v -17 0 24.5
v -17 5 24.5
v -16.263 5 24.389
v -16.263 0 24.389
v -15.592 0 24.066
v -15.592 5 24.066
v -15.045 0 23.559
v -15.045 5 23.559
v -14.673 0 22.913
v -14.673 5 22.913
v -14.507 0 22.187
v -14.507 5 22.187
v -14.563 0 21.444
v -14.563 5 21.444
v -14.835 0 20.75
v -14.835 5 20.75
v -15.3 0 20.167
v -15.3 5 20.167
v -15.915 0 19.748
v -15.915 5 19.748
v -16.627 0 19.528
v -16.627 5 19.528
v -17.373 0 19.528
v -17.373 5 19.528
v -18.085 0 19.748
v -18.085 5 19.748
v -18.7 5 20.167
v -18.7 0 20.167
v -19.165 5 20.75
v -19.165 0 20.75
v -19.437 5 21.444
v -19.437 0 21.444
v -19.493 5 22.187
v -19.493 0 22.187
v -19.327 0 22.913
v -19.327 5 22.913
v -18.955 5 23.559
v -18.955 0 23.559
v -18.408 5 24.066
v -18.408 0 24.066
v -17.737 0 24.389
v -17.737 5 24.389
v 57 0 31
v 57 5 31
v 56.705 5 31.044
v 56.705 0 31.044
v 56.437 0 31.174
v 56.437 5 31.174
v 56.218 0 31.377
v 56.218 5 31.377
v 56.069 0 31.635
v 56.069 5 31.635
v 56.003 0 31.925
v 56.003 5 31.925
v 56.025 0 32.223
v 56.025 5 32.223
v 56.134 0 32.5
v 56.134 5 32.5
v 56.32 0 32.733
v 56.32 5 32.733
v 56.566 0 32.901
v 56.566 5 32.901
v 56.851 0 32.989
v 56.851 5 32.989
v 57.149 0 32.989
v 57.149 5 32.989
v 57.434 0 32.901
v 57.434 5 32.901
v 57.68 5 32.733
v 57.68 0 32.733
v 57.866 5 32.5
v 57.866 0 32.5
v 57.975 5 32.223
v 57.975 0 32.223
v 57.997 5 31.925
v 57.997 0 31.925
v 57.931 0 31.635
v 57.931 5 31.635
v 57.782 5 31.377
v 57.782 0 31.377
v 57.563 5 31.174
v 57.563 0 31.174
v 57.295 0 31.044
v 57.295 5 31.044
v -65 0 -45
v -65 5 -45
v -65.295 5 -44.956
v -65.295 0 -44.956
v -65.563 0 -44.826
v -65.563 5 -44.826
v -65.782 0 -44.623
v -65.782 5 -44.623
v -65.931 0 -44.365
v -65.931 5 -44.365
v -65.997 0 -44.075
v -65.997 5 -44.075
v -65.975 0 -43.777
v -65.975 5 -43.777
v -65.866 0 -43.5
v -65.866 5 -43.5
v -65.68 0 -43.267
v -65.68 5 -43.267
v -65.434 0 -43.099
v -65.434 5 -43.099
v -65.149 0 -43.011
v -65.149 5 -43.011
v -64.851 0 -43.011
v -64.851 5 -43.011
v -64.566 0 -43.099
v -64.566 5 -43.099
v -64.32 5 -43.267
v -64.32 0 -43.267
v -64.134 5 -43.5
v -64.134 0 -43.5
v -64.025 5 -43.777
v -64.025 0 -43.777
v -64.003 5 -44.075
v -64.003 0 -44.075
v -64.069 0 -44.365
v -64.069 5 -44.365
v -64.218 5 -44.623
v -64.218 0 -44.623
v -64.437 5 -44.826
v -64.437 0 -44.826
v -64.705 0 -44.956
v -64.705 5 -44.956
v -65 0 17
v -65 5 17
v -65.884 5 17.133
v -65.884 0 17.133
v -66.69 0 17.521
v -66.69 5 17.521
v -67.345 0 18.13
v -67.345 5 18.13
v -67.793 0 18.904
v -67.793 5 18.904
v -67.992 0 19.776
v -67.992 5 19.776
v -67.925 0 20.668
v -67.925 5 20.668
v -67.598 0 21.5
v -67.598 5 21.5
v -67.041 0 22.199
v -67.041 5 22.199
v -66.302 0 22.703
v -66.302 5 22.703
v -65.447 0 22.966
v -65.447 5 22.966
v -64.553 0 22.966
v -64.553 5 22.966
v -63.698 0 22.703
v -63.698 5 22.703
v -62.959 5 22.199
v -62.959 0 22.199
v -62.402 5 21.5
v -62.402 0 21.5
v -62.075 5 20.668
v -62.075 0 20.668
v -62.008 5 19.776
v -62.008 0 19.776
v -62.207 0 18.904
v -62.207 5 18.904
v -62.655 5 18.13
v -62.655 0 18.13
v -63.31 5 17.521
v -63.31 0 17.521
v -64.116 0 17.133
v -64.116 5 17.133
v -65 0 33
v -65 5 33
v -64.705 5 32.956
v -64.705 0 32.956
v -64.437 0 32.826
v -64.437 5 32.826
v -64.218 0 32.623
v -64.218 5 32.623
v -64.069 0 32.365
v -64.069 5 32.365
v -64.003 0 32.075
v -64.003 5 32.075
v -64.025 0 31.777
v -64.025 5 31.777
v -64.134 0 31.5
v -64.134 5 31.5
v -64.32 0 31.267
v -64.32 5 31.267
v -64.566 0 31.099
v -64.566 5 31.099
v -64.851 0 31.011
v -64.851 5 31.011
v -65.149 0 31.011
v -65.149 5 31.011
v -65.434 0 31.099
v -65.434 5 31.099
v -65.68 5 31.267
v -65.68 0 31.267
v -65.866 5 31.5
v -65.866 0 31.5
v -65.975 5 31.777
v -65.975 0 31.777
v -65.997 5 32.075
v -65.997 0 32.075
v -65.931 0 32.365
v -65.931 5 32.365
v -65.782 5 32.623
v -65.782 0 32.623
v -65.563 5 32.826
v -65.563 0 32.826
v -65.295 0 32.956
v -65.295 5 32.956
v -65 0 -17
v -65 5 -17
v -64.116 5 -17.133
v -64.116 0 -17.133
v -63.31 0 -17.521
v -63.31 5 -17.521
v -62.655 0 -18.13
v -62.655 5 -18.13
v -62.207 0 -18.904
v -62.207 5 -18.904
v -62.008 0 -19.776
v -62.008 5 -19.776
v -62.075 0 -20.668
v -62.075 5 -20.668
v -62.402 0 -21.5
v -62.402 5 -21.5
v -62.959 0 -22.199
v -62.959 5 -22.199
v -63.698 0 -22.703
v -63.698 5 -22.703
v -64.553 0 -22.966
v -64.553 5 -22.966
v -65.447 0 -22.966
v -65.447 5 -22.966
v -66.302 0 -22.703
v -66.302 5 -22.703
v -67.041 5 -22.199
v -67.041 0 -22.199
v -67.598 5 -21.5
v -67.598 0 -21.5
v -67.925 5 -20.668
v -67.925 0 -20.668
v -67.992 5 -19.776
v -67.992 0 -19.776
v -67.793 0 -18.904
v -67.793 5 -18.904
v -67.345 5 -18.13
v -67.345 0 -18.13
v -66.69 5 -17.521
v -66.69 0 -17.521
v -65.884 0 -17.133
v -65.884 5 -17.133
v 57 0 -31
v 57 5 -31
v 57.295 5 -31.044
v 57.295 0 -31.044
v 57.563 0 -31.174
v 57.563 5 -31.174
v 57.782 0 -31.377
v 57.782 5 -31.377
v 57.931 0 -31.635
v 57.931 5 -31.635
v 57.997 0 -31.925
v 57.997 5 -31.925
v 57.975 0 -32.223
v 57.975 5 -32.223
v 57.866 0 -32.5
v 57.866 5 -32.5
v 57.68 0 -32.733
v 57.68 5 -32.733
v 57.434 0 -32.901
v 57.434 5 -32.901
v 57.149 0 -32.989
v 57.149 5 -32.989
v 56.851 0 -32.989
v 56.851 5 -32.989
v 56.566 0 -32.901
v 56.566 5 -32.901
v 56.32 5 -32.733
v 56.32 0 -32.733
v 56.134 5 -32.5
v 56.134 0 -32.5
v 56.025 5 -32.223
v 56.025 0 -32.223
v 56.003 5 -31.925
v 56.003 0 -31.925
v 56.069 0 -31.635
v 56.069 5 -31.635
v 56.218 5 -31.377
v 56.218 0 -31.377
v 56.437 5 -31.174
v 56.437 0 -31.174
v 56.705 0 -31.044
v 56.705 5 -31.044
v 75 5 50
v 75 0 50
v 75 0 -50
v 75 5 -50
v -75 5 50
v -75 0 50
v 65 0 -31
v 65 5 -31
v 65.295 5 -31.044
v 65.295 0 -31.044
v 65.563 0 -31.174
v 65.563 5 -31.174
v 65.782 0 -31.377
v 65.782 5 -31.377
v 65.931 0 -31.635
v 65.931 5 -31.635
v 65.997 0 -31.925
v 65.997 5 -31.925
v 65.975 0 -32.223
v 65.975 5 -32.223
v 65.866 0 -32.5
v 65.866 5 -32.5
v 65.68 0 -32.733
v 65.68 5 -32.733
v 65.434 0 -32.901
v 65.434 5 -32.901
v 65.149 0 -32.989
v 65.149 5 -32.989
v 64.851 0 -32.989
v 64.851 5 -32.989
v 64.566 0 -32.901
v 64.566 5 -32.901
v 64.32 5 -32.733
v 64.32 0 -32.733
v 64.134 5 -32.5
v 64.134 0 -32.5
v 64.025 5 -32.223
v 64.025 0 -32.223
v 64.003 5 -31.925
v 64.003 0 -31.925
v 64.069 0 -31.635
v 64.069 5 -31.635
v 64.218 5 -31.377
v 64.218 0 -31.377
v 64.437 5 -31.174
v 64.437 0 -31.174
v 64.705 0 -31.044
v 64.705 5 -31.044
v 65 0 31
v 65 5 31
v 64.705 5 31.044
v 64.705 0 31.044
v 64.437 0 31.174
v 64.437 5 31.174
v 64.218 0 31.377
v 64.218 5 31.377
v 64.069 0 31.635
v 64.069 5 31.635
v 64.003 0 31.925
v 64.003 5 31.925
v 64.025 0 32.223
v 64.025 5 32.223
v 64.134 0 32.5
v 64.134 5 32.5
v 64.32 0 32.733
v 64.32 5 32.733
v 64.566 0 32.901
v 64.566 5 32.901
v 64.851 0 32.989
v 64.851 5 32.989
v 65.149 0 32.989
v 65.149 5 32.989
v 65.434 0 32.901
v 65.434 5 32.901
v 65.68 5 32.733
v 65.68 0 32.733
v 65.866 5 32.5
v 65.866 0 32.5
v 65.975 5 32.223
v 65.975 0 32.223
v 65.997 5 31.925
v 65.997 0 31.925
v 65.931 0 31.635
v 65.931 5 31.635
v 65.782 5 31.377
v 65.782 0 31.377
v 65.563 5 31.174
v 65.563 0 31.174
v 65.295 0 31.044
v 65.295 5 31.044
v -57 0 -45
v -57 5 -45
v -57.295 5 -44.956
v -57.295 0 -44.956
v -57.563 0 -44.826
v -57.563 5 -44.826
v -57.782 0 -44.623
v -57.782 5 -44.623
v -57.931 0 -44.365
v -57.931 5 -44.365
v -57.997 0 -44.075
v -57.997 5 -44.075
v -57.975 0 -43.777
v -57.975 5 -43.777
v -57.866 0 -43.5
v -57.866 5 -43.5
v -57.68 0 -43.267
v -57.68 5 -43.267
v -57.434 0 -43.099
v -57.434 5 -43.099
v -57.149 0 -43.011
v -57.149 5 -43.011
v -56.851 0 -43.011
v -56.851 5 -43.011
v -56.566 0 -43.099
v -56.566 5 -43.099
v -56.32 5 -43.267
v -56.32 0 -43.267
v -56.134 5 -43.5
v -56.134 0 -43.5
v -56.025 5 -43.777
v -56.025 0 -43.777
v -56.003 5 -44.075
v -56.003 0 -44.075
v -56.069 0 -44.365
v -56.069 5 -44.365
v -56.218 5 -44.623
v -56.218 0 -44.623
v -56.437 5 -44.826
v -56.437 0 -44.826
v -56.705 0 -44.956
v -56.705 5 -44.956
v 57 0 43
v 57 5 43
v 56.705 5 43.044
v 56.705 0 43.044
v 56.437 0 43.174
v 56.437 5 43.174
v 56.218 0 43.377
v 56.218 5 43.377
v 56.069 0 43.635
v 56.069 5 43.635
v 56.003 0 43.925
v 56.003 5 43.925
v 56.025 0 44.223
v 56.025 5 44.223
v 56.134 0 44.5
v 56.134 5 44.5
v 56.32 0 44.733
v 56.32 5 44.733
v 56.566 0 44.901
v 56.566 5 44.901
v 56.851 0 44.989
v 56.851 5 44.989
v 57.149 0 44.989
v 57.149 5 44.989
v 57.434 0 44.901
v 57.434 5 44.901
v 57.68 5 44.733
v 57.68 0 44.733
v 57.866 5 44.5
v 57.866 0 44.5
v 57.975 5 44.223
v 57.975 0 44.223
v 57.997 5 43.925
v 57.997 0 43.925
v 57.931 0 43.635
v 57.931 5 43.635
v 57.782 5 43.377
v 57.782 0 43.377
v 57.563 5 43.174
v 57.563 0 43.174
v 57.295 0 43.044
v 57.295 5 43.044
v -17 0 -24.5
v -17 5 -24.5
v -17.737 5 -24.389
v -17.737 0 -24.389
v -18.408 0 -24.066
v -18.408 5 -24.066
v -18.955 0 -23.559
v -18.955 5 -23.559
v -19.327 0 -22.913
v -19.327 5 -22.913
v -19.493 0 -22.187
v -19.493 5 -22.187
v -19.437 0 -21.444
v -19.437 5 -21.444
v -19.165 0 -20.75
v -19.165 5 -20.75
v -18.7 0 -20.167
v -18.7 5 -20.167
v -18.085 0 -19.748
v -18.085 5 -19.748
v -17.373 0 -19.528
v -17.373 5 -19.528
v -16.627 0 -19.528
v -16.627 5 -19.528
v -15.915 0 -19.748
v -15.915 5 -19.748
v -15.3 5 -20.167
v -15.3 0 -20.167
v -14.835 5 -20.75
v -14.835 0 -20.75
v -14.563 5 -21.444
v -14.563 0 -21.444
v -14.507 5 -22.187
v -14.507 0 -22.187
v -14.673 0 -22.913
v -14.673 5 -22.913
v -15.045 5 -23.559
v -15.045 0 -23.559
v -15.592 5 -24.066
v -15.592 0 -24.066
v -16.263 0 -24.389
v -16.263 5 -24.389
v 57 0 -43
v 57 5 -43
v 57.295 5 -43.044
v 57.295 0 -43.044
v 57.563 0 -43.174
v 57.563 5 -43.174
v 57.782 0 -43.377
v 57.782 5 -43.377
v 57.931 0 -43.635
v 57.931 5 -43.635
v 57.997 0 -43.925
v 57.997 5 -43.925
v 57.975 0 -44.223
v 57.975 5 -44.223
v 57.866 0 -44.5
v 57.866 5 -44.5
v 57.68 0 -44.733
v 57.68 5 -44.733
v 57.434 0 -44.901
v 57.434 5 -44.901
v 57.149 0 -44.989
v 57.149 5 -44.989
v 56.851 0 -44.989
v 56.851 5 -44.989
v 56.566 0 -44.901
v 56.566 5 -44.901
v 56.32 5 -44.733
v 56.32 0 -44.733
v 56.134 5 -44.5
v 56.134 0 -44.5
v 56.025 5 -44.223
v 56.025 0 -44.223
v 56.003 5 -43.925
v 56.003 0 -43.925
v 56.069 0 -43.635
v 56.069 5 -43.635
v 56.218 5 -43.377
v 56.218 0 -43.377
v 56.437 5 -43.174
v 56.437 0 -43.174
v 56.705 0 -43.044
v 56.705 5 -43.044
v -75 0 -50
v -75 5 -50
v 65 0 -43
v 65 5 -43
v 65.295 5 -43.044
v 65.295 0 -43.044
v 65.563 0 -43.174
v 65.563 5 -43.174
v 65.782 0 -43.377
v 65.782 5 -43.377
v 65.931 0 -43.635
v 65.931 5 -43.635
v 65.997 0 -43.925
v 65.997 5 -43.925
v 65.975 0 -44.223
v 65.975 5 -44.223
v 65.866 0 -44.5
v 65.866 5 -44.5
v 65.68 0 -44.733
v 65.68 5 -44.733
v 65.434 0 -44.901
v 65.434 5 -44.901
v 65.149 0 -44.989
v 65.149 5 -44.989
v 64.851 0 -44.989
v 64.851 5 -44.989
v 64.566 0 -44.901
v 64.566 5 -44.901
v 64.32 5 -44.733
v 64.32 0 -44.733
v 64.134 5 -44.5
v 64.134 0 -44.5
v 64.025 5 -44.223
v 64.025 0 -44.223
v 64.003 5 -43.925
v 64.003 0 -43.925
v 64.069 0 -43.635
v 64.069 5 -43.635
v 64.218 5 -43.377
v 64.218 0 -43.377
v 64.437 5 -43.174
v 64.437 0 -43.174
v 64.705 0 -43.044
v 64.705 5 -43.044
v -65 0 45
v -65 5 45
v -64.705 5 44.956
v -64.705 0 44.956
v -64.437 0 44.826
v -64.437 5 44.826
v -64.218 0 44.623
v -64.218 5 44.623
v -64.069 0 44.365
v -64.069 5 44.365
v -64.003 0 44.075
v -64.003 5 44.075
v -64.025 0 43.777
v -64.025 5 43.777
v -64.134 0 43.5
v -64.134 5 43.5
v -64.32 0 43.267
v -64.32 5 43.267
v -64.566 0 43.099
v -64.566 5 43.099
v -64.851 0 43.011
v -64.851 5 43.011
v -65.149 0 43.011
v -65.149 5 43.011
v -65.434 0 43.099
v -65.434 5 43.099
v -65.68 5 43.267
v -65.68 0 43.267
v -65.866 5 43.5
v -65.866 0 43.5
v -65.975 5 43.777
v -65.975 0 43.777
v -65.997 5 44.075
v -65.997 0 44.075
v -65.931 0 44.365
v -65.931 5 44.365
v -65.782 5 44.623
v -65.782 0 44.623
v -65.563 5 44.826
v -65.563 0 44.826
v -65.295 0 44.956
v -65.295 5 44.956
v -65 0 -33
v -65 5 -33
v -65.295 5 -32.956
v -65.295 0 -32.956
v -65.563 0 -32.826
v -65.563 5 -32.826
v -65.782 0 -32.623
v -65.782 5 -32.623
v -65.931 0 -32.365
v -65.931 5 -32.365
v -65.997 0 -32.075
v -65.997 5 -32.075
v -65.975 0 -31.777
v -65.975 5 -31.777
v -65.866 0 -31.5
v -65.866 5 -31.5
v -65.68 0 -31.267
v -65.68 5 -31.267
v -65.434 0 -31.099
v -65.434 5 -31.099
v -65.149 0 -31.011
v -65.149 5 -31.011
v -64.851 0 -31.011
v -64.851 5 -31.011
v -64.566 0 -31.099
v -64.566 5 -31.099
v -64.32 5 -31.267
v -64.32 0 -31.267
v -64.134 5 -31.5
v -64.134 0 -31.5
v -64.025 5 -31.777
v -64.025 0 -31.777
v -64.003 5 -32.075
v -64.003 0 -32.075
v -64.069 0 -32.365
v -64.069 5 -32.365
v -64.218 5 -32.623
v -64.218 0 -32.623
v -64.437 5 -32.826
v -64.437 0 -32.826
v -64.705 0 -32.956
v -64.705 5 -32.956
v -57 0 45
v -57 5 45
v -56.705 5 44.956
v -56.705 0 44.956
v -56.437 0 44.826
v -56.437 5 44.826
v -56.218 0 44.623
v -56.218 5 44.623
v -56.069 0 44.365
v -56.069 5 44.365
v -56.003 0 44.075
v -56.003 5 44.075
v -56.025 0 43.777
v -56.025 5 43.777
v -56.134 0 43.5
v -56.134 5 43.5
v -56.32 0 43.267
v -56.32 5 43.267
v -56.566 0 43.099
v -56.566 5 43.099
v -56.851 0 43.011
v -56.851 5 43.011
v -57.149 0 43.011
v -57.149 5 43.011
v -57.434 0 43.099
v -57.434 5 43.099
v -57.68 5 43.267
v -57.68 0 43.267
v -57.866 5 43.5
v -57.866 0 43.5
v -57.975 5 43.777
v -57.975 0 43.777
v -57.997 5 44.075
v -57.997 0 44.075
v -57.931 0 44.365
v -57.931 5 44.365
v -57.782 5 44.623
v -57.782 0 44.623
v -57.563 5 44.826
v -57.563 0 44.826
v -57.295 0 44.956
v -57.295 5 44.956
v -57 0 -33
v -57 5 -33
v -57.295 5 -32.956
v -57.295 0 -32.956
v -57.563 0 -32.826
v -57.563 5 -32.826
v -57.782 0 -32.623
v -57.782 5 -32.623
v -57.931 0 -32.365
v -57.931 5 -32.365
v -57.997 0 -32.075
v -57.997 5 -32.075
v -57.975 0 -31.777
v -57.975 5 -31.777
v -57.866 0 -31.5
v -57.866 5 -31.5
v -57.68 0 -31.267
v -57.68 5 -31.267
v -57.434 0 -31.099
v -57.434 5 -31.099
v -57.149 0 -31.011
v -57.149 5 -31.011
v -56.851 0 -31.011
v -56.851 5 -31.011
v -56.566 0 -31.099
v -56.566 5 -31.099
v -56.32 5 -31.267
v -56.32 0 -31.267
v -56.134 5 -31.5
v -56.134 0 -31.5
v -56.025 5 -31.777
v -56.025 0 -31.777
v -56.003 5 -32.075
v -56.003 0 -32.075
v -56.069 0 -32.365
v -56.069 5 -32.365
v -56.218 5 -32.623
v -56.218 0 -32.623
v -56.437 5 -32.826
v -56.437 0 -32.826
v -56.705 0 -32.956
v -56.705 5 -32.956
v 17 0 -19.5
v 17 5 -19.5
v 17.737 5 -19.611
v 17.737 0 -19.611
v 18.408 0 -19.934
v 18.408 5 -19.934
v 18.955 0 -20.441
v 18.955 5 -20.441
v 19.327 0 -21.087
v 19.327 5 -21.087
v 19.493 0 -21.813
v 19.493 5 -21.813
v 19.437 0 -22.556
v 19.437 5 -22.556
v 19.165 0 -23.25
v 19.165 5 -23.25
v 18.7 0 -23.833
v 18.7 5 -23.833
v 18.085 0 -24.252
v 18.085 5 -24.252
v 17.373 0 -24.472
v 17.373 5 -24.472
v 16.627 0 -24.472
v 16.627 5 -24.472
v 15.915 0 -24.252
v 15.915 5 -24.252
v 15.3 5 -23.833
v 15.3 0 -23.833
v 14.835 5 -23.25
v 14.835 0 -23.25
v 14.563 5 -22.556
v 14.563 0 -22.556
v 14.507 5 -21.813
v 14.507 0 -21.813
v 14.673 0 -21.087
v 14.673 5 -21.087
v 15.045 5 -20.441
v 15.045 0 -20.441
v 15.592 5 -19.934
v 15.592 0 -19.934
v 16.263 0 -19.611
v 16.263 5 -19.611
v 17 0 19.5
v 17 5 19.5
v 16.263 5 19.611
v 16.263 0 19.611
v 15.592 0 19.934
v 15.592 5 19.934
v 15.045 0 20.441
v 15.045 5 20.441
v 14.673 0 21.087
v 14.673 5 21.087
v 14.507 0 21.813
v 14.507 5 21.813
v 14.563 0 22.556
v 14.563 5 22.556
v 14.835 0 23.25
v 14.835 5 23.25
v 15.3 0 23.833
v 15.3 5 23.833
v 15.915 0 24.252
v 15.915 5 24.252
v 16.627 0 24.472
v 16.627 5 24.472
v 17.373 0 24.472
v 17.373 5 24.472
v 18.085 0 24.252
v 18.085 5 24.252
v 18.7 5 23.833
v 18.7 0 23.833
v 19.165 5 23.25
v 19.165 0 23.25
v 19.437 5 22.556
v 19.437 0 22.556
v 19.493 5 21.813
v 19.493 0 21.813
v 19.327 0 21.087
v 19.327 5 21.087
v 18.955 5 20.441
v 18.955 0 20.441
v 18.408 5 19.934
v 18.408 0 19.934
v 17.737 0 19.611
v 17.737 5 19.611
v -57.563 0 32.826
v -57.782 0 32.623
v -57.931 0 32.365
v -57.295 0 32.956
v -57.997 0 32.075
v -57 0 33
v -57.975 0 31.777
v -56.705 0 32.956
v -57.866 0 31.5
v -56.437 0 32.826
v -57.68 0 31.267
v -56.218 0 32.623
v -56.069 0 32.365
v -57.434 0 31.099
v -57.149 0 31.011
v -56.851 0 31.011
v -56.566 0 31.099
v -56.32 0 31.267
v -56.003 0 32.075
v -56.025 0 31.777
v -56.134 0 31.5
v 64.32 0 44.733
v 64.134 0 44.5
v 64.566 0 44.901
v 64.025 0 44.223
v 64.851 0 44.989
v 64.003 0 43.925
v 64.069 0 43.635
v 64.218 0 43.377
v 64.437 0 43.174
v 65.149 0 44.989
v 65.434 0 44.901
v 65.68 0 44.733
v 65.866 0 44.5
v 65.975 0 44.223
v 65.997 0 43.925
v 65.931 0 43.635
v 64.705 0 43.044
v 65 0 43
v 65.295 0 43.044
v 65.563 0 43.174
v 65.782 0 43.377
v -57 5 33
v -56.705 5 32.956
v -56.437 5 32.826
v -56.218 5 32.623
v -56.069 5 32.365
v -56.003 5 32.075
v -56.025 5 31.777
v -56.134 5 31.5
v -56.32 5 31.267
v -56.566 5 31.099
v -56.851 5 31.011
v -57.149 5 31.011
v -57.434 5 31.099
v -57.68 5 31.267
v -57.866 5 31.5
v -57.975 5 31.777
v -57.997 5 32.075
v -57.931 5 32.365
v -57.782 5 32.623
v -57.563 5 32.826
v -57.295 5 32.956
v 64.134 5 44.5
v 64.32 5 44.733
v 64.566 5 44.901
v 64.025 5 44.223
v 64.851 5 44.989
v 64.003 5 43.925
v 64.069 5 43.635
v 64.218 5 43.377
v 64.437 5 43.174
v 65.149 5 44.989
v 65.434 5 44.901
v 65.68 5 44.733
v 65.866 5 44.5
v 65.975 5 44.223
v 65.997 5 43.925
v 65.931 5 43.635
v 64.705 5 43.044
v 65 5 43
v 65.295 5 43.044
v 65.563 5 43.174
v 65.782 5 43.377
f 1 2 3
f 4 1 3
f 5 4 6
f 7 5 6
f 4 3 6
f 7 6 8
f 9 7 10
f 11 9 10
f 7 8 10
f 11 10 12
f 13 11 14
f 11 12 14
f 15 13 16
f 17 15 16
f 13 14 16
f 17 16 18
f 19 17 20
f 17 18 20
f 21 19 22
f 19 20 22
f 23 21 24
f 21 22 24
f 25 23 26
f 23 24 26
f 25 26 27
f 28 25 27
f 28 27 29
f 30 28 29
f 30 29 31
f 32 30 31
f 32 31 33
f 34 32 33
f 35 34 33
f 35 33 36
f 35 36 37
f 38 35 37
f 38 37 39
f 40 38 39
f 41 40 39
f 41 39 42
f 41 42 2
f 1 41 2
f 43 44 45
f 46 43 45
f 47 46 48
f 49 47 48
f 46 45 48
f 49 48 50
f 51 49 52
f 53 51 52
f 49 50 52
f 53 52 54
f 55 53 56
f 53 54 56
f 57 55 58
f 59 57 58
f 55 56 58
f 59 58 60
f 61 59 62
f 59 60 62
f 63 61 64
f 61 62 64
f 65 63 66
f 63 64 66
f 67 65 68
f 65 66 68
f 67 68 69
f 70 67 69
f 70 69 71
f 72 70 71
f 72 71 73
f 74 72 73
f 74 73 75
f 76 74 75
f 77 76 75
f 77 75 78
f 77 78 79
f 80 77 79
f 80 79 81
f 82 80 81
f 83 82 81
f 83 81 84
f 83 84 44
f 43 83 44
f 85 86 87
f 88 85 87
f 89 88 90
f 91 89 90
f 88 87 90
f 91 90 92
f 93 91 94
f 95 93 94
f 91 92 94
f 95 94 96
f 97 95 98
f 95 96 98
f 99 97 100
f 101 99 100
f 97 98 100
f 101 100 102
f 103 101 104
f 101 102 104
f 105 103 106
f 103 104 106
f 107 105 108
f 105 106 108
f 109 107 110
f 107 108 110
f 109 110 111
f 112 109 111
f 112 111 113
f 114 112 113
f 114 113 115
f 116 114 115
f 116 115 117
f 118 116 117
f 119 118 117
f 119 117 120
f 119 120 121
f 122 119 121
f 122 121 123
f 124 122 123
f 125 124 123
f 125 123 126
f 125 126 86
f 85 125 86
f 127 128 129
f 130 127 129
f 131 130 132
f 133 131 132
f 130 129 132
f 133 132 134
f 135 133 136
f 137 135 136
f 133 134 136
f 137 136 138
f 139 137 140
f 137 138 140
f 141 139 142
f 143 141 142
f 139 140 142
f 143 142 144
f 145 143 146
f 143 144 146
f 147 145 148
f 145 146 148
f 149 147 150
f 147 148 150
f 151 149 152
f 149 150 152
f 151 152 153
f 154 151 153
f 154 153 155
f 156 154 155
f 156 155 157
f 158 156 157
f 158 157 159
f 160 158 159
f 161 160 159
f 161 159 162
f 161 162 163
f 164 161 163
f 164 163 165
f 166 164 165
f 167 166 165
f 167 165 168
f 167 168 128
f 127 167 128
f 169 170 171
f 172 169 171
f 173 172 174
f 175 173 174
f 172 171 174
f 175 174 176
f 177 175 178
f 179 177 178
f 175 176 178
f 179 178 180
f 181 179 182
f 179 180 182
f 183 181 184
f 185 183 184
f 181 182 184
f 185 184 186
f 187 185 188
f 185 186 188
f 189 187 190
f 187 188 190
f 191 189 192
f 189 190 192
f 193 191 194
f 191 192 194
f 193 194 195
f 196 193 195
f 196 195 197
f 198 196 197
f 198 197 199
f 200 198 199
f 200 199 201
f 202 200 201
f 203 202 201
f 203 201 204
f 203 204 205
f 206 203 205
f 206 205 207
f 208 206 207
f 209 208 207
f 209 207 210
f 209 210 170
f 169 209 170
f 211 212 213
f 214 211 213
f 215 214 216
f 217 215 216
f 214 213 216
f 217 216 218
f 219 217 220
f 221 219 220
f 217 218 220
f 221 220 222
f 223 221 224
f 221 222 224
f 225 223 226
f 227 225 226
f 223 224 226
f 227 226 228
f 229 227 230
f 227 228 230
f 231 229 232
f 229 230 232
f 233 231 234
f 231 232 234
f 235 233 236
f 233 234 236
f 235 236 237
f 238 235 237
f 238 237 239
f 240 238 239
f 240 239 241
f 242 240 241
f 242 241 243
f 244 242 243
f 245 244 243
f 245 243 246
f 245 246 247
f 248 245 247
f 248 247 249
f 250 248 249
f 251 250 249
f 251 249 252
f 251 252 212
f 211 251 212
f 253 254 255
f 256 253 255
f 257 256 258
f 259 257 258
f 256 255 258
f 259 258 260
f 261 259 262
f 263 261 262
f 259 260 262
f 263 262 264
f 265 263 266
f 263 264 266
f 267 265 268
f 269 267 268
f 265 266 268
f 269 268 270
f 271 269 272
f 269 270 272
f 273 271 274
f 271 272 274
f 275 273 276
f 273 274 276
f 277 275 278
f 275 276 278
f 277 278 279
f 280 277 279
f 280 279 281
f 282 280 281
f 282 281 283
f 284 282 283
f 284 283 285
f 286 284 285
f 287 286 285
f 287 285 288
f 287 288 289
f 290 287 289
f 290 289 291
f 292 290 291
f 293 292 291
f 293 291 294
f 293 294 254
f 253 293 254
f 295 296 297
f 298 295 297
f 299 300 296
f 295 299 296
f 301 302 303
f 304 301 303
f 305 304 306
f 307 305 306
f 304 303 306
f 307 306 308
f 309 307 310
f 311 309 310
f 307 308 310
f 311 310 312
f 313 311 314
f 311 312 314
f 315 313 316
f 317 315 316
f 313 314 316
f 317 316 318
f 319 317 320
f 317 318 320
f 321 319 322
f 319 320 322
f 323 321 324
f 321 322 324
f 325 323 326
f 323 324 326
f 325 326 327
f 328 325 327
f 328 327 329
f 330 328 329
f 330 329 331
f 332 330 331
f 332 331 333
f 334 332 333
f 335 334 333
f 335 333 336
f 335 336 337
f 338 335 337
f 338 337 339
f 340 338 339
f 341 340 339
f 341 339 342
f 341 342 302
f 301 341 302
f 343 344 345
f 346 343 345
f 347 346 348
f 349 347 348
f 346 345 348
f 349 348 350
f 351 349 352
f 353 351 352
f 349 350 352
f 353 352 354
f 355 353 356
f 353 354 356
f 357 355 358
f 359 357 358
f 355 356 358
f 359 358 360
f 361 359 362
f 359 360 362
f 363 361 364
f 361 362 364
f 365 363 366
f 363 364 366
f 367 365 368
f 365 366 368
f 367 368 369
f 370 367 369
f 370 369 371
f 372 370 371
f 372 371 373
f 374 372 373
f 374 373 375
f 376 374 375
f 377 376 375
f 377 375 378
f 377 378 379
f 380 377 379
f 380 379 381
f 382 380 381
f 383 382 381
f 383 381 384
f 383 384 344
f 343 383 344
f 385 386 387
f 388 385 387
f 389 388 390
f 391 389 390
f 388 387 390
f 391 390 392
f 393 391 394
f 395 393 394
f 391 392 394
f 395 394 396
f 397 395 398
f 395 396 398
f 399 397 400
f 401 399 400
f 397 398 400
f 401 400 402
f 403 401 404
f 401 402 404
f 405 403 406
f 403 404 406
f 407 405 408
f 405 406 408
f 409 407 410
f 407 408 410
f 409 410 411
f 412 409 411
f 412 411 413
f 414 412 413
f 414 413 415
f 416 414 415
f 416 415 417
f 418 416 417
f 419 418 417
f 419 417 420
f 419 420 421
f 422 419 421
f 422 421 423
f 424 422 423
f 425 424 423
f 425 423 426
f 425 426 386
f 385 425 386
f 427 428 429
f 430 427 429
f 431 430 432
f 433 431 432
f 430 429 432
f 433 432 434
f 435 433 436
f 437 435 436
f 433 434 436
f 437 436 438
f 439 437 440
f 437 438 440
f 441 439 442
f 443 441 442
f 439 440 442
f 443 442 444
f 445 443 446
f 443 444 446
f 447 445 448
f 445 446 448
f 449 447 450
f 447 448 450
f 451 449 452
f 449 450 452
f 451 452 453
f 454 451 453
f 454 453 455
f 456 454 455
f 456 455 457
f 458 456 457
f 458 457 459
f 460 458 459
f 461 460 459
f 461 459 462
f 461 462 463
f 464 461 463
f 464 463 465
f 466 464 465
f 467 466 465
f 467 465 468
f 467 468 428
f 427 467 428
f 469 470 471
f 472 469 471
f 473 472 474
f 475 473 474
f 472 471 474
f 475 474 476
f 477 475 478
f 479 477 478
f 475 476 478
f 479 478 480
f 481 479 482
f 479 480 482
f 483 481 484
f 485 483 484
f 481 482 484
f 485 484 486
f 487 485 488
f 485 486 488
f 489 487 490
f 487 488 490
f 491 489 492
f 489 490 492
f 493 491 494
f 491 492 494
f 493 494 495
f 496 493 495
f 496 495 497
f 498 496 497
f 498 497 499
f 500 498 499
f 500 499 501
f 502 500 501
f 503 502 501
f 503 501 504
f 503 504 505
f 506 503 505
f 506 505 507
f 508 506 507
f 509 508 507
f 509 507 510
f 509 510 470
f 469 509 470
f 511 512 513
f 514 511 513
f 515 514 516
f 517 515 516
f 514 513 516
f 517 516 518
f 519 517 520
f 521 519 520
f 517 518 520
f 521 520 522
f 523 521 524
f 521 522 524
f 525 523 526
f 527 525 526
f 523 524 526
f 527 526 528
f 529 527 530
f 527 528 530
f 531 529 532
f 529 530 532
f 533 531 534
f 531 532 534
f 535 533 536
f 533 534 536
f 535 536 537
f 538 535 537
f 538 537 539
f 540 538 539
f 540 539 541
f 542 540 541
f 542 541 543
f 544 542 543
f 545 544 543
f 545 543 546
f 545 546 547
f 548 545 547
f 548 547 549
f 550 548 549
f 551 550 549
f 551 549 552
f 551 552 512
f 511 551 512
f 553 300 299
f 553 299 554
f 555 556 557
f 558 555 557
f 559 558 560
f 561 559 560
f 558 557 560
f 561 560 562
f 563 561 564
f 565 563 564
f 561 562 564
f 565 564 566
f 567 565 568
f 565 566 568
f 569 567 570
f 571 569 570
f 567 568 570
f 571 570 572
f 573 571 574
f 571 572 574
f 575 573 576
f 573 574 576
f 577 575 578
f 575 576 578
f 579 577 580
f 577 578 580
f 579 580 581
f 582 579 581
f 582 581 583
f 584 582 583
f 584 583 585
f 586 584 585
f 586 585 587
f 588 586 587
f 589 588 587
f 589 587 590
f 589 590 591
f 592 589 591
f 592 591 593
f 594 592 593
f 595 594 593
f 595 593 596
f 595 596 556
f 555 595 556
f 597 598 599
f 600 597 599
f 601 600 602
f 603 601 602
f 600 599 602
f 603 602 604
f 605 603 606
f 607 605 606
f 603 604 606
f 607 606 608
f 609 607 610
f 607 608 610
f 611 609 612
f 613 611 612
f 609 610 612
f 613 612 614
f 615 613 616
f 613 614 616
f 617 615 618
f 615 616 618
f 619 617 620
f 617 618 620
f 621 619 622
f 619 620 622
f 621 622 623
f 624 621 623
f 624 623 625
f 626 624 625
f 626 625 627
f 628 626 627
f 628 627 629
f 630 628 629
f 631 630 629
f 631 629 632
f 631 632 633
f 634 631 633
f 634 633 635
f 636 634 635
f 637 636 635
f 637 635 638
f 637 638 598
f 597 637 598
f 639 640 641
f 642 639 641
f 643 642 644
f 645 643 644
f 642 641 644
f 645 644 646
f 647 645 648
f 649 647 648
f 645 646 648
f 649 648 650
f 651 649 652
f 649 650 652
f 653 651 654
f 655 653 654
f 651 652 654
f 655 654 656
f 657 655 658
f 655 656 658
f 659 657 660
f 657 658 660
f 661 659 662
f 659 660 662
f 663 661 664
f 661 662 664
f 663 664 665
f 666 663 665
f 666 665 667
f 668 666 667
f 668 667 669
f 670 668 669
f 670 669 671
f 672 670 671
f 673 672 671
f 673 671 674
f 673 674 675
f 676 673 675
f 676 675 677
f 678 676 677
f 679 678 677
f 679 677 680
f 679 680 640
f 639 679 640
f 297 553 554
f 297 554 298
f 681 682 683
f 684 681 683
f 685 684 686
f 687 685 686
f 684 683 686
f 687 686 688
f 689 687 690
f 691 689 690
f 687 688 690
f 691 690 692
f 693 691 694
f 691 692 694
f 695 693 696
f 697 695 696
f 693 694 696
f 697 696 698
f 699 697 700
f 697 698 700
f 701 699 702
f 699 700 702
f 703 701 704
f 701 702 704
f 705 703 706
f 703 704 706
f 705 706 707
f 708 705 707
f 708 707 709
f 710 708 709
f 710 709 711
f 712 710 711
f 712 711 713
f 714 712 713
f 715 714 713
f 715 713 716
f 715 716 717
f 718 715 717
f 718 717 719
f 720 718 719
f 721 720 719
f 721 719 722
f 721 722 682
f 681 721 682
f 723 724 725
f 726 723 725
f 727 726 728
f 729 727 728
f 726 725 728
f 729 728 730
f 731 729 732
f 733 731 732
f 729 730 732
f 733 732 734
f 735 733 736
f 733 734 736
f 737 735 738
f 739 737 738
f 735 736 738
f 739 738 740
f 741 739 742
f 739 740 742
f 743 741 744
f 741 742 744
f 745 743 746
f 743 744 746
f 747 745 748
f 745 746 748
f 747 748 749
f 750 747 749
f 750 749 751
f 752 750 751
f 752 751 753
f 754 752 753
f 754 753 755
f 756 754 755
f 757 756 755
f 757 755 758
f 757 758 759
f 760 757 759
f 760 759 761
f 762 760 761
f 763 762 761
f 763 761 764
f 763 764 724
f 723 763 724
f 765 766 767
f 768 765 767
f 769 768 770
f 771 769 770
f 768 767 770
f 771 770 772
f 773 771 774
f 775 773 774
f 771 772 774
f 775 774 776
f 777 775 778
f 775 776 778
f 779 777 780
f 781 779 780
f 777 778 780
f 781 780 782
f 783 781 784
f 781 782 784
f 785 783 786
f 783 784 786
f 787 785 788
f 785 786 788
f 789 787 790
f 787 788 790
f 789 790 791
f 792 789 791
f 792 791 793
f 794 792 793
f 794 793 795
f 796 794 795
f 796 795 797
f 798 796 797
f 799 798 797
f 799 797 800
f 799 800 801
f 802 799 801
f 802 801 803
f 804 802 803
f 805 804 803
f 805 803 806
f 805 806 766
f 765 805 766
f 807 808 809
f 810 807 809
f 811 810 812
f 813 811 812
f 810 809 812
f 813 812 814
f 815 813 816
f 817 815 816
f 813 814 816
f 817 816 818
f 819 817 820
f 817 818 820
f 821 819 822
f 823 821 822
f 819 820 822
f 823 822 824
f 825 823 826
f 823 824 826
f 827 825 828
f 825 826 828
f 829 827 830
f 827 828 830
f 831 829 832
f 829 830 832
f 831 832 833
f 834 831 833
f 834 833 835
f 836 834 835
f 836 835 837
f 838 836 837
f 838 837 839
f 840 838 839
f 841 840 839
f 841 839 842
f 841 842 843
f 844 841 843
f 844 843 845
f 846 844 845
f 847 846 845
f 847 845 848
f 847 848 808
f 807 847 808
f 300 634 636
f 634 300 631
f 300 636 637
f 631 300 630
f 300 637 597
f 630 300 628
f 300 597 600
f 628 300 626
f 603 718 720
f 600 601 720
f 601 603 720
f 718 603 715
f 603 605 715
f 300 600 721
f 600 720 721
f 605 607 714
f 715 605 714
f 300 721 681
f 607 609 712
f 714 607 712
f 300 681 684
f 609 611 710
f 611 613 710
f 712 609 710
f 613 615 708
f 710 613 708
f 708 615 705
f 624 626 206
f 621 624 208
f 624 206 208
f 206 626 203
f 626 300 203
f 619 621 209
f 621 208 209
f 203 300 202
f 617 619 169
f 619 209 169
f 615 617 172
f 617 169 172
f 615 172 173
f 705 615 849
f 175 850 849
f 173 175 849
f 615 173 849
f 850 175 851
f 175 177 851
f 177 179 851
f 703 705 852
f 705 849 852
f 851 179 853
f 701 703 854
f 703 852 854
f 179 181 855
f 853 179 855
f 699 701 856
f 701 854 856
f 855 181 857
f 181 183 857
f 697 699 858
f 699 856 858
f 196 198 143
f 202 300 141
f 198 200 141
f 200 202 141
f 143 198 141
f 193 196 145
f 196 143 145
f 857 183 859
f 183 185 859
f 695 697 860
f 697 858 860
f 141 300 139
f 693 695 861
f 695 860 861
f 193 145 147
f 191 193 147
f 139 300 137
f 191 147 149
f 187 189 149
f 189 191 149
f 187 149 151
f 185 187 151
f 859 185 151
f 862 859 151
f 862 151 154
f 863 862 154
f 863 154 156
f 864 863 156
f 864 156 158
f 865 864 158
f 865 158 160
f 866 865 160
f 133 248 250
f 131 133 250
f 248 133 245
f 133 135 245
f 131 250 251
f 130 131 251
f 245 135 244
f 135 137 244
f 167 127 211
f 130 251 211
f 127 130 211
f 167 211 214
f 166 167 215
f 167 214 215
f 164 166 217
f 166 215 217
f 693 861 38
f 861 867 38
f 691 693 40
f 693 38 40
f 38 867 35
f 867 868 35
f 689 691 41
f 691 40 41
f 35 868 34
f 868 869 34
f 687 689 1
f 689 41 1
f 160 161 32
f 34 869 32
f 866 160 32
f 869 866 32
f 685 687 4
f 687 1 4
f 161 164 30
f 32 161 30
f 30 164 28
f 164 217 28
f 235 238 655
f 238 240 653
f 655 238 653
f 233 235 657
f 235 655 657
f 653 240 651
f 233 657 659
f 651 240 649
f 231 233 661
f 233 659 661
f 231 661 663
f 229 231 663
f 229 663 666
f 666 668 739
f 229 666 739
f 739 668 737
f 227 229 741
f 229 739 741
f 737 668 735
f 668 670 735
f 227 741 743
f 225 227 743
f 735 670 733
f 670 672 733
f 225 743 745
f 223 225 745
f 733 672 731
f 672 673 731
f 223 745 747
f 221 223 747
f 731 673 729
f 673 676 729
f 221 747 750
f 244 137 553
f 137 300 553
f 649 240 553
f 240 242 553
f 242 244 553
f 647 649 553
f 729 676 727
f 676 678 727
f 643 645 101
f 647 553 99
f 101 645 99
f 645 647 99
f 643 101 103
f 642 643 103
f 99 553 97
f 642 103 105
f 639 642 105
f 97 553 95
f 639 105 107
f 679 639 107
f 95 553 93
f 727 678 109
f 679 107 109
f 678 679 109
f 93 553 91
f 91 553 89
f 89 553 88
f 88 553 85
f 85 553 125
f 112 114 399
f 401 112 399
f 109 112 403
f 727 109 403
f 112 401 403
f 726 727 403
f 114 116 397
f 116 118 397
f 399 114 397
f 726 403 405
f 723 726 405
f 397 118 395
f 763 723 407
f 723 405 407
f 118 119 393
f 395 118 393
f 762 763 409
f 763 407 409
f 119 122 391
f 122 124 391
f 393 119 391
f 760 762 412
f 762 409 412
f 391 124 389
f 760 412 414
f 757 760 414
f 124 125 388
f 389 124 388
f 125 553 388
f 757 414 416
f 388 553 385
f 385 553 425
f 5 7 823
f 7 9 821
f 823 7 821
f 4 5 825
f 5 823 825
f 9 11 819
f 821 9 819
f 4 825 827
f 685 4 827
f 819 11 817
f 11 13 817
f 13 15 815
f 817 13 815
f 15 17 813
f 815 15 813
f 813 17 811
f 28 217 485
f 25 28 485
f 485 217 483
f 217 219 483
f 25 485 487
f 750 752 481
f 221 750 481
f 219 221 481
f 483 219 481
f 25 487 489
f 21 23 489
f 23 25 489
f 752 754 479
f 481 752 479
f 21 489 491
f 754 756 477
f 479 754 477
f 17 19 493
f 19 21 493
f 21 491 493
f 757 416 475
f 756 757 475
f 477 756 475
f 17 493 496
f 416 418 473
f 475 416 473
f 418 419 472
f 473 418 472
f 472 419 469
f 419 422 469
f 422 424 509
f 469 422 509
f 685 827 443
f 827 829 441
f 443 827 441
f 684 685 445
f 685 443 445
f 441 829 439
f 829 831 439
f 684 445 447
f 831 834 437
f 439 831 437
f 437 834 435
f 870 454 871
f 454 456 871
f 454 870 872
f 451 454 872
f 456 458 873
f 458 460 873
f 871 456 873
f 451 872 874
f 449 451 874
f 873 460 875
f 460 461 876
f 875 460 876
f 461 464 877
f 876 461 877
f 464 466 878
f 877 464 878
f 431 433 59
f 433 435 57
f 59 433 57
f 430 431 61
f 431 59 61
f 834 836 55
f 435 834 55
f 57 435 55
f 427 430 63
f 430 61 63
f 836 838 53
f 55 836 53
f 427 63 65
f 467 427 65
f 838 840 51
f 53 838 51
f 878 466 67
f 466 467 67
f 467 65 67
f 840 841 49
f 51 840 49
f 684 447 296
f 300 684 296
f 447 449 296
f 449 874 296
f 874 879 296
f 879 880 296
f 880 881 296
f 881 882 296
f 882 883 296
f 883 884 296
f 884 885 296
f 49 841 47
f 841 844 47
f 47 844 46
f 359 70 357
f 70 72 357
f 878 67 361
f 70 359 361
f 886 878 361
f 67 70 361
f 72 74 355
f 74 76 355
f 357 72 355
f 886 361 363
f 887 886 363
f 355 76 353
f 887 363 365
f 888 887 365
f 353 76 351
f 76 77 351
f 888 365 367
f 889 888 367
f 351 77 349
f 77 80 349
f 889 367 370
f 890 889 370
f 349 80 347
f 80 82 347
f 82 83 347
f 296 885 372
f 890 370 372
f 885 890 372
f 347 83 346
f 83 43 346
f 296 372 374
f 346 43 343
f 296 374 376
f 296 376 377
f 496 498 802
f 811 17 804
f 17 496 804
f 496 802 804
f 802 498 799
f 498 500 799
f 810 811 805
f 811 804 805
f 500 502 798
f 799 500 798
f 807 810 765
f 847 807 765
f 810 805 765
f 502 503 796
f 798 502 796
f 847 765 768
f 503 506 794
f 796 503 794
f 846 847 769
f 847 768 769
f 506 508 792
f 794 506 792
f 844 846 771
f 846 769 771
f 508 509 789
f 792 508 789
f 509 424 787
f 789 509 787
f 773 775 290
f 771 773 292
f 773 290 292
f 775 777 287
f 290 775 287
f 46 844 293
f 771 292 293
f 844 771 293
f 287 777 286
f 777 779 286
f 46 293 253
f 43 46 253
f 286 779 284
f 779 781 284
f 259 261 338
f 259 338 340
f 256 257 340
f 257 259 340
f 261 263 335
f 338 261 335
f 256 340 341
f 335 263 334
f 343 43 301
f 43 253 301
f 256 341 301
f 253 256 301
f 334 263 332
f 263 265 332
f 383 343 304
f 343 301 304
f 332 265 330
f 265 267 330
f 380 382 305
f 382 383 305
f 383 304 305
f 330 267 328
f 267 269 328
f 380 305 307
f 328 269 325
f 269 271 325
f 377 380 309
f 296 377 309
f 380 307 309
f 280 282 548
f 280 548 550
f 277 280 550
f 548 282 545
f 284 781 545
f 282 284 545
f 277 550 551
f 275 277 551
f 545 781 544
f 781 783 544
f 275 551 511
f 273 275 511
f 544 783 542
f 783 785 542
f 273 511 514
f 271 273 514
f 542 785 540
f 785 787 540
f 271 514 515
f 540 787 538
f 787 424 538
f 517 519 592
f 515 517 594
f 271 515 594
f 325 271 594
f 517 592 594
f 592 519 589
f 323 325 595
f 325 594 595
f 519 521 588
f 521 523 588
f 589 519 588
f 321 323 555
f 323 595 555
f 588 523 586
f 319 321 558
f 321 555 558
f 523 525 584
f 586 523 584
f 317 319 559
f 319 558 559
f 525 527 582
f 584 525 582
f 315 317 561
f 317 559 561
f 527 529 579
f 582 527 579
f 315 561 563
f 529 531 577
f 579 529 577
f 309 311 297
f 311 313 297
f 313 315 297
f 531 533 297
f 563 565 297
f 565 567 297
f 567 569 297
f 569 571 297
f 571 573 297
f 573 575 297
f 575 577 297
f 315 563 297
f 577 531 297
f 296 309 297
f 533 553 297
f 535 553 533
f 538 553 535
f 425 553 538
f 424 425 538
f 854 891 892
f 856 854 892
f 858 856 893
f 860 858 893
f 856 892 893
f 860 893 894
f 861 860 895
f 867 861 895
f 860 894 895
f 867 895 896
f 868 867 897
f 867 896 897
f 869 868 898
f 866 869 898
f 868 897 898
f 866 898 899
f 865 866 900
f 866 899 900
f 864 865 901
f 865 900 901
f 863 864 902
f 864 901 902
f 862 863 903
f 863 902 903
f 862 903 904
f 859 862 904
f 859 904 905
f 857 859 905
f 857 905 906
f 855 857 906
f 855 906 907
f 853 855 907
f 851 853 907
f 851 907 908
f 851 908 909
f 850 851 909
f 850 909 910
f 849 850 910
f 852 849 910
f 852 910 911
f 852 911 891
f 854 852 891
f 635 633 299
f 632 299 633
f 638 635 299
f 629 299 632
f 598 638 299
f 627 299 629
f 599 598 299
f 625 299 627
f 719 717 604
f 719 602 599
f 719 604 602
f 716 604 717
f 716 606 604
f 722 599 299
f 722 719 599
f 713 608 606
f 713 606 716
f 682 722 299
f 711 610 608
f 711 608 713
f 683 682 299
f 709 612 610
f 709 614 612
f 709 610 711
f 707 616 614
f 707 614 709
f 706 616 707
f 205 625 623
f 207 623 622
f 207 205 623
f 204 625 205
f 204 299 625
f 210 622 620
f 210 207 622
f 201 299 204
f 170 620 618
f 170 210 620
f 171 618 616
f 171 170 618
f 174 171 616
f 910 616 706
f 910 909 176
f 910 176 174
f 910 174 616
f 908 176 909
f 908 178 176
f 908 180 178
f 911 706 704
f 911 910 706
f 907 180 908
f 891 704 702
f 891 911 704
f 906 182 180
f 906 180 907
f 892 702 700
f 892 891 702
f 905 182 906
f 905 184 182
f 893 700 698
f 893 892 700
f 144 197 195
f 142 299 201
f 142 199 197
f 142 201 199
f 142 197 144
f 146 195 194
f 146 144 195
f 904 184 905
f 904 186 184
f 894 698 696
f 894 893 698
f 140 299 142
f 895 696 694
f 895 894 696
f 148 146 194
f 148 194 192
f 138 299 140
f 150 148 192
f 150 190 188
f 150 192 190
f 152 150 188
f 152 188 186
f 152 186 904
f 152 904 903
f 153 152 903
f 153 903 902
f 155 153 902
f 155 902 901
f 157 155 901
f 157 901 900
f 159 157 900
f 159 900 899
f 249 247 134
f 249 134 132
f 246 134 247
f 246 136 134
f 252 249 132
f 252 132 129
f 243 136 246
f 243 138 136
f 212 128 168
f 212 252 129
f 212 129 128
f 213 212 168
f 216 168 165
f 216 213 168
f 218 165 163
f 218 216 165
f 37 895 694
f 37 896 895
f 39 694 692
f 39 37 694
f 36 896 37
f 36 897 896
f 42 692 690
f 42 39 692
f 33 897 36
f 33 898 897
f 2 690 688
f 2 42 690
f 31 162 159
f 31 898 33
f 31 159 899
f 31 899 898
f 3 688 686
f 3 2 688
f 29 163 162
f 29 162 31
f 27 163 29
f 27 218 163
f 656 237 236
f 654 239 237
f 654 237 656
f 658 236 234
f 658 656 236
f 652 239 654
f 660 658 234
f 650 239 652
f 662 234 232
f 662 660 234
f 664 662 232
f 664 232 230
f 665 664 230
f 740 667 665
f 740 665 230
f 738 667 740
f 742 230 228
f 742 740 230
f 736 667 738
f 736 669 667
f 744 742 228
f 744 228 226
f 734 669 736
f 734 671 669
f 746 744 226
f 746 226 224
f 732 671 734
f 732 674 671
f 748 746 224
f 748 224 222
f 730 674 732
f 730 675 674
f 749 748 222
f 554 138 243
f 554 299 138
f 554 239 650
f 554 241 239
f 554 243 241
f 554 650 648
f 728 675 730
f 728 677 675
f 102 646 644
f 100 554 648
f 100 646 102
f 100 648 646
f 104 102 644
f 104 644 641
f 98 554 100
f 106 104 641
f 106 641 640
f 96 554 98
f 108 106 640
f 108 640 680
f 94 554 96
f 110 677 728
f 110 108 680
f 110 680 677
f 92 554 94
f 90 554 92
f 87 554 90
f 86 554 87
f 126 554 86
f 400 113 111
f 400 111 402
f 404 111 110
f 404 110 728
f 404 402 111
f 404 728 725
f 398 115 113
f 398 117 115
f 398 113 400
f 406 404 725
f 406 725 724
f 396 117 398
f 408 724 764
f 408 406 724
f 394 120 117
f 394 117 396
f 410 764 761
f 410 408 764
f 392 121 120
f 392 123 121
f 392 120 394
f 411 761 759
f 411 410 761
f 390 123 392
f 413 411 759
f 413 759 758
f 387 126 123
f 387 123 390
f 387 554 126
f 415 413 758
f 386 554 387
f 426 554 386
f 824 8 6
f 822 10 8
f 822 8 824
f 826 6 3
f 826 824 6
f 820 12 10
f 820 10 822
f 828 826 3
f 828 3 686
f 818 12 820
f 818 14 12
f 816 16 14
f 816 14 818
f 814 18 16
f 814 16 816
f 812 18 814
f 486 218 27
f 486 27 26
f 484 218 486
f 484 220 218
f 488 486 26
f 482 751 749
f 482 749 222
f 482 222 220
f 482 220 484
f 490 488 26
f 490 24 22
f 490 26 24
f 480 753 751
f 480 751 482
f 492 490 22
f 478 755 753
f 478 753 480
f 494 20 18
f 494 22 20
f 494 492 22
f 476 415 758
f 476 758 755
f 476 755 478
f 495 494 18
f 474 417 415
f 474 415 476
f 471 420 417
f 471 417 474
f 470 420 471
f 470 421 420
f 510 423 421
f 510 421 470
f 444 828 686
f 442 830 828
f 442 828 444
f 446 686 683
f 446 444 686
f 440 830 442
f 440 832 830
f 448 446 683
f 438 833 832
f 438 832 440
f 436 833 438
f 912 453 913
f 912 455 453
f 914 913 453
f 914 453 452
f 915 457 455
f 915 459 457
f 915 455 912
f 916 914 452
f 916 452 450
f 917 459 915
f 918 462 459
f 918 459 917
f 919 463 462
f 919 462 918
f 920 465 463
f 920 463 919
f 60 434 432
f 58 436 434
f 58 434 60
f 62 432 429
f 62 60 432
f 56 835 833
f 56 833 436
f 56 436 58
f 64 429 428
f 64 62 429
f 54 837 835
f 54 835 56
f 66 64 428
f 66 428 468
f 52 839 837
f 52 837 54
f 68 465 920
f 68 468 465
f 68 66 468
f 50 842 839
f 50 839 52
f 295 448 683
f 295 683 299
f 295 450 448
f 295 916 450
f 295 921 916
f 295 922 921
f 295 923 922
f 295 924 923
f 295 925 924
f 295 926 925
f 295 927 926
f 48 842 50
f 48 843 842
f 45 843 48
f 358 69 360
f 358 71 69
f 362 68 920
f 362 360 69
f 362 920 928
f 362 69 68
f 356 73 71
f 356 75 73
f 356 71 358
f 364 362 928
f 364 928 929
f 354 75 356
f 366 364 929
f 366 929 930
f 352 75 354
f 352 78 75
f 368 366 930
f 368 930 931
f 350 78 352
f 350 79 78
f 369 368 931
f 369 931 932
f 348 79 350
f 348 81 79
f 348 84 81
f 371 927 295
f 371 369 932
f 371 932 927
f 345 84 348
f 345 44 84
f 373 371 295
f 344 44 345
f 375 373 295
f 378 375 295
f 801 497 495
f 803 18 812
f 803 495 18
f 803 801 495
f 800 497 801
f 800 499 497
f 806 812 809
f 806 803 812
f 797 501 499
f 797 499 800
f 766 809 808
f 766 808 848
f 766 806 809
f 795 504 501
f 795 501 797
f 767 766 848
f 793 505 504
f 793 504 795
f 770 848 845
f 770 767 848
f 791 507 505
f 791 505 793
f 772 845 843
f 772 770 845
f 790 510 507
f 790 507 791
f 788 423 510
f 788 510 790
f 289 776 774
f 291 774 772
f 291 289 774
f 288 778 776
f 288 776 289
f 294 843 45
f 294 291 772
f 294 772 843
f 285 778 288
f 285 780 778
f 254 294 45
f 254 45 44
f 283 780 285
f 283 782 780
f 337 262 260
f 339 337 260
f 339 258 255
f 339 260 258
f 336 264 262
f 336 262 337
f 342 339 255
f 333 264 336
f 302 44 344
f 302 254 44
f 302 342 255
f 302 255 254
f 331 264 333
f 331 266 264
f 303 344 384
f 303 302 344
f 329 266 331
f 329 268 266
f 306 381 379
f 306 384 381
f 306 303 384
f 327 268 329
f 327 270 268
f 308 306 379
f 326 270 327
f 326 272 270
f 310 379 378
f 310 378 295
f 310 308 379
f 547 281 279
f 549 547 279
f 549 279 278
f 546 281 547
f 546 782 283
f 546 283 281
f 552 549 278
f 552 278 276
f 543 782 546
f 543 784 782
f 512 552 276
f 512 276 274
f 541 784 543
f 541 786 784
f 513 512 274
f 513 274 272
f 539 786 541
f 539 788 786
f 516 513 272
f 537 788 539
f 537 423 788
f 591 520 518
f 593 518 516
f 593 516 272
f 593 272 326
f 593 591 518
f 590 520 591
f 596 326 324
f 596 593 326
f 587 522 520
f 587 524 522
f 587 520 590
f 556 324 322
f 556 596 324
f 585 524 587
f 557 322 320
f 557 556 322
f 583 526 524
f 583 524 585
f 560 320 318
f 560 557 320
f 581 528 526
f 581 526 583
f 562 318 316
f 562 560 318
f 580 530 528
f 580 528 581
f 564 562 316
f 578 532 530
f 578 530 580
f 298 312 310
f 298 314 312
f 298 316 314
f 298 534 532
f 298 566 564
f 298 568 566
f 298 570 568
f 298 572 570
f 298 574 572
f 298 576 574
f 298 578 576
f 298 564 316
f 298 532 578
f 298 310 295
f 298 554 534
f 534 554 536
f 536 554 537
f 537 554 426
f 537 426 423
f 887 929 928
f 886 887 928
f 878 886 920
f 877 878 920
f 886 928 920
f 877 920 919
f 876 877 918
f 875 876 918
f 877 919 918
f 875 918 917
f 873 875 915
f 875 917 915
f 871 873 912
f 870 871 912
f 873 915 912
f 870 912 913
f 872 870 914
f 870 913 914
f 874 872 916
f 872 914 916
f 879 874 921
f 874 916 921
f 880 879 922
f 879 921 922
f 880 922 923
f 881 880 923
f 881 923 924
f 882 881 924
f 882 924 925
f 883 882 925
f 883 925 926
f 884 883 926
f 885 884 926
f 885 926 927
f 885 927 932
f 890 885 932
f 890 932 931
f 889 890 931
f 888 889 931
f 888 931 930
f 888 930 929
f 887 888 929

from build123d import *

# Parameters (mm, degrees)
SKETCH1_W           = 150
SKETCH1_H           = 100
BOSS_EXTRUDE1_DEPTH = 5
SKETCH2_R           = 2.5
SKETCH2_R_2         = 1
CUT_EXTRUDE1_DEPTH  = 91.277350426
SKETCH3_R           = 3
CUT_EXTRUDE2_DEPTH  = 91.277350426


with BuildPart() as part:
    # Sketch1 → Boss-Extrude1 (new body)
    with BuildSketch(Plane(origin=(0, 0, 0), x_dir=(1, 0, 0), z_dir=(0, 1, 0))):
        Rectangle(SKETCH1_W, SKETCH1_H)
    extrude(amount=BOSS_EXTRUDE1_DEPTH)

    # Sketch2 → Cut-Extrude1 (cut, through all)
    with BuildSketch(Plane(origin=(0, 5, 0), x_dir=(1, 0, 0), z_dir=(0, 1, 0))):
        with Locations(Location((17, 22, 0), (0, 0, 270))):
            Circle(SKETCH2_R)
        with Locations(Location((17, -22, 0), (0, 0, 90))):
            Circle(SKETCH2_R)
        with Locations(Location((-17, 22, 0), (0, 0, 90))):
            Circle(SKETCH2_R)
        with Locations(Location((-17, -22, 0), (0, 0, 270))):
            Circle(SKETCH2_R)
        with Locations(Location((65, 44, 0), (0, 0, 270))):
            Circle(SKETCH2_R_2)
        with Locations(Location((65, 32, 0), (0, 0, 270))):
            Circle(SKETCH2_R_2)
        with Locations(Location((57, 44, 0), (0, 0, 270))):
            Circle(SKETCH2_R_2)
        with Locations(Location((57, 32, 0), (0, 0, 270))):
            Circle(SKETCH2_R_2)
        with Locations(Location((65, -32, 0), (0, 0, 90))):
            Circle(SKETCH2_R_2)
        with Locations(Location((57, -32, 0), (0, 0, 90))):
            Circle(SKETCH2_R_2)
        with Locations(Location((65, -44, 0), (0, 0, 90))):
            Circle(SKETCH2_R_2)
        with Locations(Location((57, -44, 0), (0, 0, 90))):
            Circle(SKETCH2_R_2)
        with Locations(Location((-65, 32, 0), (0, 0, 90))):
            Circle(SKETCH2_R_2)
        with Locations(Location((-57, 32, 0), (0, 0, 90))):
            Circle(SKETCH2_R_2)
        with Locations(Location((-65, 44, 0), (0, 0, 90))):
            Circle(SKETCH2_R_2)
        with Locations(Location((-57, 44, 0), (0, 0, 90))):
            Circle(SKETCH2_R_2)
        with Locations(Location((-57, -44, 0), (0, 0, 270))):
            Circle(SKETCH2_R_2)
        with Locations(Location((-65, -44, 0), (0, 0, 270))):
            Circle(SKETCH2_R_2)
        with Locations(Location((-57, -32, 0), (0, 0, 270))):
            Circle(SKETCH2_R_2)
        with Locations(Location((-65, -32, 0), (0, 0, 270))):
            Circle(SKETCH2_R_2)
    extrude(amount=-CUT_EXTRUDE1_DEPTH, mode=Mode.SUBTRACT)

    # Sketch3 → Cut-Extrude2 (cut, through all)
    with BuildSketch(Plane(origin=(0, 5, 0), x_dir=(1, 0, 0), z_dir=(0, 1, 0))):
        with Locations(Location((-65, 20, 0), (0, 0, 270))):
            Circle(SKETCH3_R)
        with Locations(Location((-65, -20, 0), (0, 0, 90))):
            Circle(SKETCH3_R)
    extrude(amount=-CUT_EXTRUDE2_DEPTH, mode=Mode.SUBTRACT)


solid = part.part
